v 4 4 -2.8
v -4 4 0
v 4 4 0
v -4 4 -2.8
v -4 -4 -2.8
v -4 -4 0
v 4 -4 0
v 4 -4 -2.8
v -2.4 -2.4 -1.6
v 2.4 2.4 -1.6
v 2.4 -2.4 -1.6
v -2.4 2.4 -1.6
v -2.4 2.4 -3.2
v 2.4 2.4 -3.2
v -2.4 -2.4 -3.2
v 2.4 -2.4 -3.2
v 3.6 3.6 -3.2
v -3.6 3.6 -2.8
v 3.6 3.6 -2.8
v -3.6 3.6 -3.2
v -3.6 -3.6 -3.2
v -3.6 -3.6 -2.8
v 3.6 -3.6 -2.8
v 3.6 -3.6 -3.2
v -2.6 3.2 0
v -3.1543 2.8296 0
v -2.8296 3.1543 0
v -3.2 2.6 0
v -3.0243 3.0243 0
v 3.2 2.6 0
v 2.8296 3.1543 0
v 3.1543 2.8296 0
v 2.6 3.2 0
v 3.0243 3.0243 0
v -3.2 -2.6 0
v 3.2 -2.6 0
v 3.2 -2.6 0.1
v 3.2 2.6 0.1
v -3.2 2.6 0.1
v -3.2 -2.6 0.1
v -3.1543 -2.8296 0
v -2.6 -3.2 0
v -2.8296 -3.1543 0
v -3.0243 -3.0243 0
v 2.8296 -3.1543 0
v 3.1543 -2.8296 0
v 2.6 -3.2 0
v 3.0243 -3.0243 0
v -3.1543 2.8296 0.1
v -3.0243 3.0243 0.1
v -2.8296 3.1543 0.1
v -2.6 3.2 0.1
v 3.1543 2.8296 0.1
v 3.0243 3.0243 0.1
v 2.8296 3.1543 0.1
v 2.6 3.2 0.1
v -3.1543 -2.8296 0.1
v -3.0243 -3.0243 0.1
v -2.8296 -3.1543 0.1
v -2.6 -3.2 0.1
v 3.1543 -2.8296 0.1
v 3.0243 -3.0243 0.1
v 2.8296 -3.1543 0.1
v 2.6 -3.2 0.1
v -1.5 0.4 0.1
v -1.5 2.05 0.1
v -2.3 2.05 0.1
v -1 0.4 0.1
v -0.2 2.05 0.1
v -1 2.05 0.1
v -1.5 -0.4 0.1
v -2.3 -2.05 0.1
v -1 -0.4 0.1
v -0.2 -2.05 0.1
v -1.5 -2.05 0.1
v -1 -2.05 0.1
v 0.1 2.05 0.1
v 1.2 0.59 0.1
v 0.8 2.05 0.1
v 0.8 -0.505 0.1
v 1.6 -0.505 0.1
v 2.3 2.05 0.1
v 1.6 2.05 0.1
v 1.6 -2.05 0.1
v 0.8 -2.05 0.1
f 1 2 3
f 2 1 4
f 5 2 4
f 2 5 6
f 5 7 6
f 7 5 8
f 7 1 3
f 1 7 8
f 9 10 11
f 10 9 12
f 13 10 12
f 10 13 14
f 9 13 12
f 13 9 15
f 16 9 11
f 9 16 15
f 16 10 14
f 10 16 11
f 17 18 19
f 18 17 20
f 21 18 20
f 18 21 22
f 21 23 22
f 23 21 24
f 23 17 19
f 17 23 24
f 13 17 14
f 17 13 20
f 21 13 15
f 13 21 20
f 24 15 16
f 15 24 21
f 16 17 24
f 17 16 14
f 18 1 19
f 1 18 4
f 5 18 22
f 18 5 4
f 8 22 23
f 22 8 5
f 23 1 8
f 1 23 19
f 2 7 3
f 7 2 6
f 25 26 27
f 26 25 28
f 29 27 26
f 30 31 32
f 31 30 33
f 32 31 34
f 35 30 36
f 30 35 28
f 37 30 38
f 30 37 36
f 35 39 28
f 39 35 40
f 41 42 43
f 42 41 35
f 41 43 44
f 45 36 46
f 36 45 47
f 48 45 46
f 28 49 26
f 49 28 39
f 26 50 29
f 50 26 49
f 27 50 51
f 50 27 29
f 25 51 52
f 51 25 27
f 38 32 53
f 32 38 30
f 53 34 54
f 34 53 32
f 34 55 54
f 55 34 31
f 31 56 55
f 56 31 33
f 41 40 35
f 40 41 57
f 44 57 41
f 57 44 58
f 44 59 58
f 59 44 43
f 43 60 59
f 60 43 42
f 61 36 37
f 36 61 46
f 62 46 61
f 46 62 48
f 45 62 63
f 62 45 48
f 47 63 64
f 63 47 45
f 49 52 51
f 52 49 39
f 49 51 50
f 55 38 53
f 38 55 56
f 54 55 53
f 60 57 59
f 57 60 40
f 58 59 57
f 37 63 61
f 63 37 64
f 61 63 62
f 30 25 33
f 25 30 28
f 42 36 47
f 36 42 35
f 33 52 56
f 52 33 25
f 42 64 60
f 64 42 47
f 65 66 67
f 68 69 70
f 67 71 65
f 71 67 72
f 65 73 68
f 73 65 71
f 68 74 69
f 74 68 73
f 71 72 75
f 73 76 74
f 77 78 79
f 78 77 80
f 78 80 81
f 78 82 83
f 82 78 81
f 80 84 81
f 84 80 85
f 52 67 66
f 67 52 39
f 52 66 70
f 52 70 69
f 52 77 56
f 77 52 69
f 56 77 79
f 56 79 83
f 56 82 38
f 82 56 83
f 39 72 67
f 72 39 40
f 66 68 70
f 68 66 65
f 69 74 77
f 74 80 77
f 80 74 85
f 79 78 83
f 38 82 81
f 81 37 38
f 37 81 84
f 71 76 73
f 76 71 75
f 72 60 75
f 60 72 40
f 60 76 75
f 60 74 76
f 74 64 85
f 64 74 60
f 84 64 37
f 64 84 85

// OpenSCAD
// file: ../p/box5.scad
use <../lib.scad>
function ldraw_lib__box5() = [
// 0 Box with 5 Faces and All Edges
// 0 Name: box5.dat
// 0 Author: James Jessiman
// 0 !LDRAW_ORG Primitive UPDATE 2012-01
// 0 !LICENSE Licensed under CC BY 4.0 : see CAreadme.txt
// 
// 0 BFC CERTIFY CCW
  [0,"BFC","CERTIFY"],
  [0,"BFC","CCW"],
// 
// 0 !HISTORY 2002-04-03 [sbliss] Modified for BFC compliance
// 0 !HISTORY 2002-04-25 [PTadmin] Official Update 2002-02
// 0 !HISTORY 2007-06-24 [PTadmin] Header formatted for Contributor Agreement
// 0 !HISTORY 2008-07-01 [PTadmin] Official Update 2008-01
// 0 !HISTORY 2012-02-16 [Philo] Changed to CCW
// 0 !HISTORY 2012-03-30 [PTadmin] Official Update 2012-01
// 
// 
// 2 24 1 1 1 -1 1 1
  [2,24,1,1,1,-1,1,1],
// 2 24 -1 1 1 -1 1 -1
  [2,24,-1,1,1,-1,1,-1],
// 2 24 -1 1 -1 1 1 -1
  [2,24,-1,1,-1,1,1,-1],
// 2 24 1 1 -1 1 1 1
  [2,24,1,1,-1,1,1,1],
// 2 24 1 0 1 -1 0 1
  [2,24,1,0,1,-1,0,1],
// 2 24 -1 0 1 -1 0 -1
  [2,24,-1,0,1,-1,0,-1],
// 2 24 -1 0 -1 1 0 -1
  [2,24,-1,0,-1,1,0,-1],
// 2 24 1 0 -1 1 0 1
  [2,24,1,0,-1,1,0,1],
// 2 24 1 0 1 1 1 1
  [2,24,1,0,1,1,1,1],
// 2 24 -1 0 1 -1 1 1
  [2,24,-1,0,1,-1,1,1],
// 2 24 1 0 -1 1 1 -1
  [2,24,1,0,-1,1,1,-1],
// 2 24 -1 0 -1 -1 1 -1
  [2,24,-1,0,-1,-1,1,-1],
// 4 16 -1 1 1 1 1 1 1 1 -1 -1 1 -1
  [4,16,-1,1,1,1,1,1,1,1,-1,-1,1,-1],
// 4 16 -1 1 1 -1 0 1 1 0 1 1 1 1
  [4,16,-1,1,1,-1,0,1,1,0,1,1,1,1],
// 4 16 -1 1 -1 -1 0 -1 -1 0 1 -1 1 1
  [4,16,-1,1,-1,-1,0,-1,-1,0,1,-1,1,1],
// 4 16 1 1 -1 1 0 -1 -1 0 -1 -1 1 -1
  [4,16,1,1,-1,1,0,-1,-1,0,-1,-1,1,-1],
// 4 16 1 1 1 1 0 1 1 0 -1 1 1 -1
  [4,16,1,1,1,1,0,1,1,0,-1,1,1,-1],
];
module ldraw_lib__box5(step=0, col=false, unit=2/5, alt=false, line=0.2, solid=!$preview)
    makepoly(ldraw_lib__box5(), step=step, col=col, unit=unit, alt=alt, line=line, solid=solid);
ldraw_lib__box5(line=0.2);
// file: ../p/box4.scad
use <../lib.scad>
function ldraw_lib__box4() = [
// 0 Box with 4 Faces (2 Parallel Pairs) and All Edges
// 0 Name: box4.dat
// 0 Author: James Jessiman
// 0 !LDRAW_ORG Primitive UPDATE 2012-01
// 0 !LICENSE Licensed under CC BY 4.0 : see CAreadme.txt
// 
// 0 BFC CERTIFY CCW
  [0,"BFC","CERTIFY"],
  [0,"BFC","CCW"],
// 
// 0 !HISTORY 2002-04-03 [sbliss] Modified for BFC compliance
// 0 !HISTORY 2002-04-25 [PTadmin] Official Update 2002-02
// 0 !HISTORY 2007-06-24 [PTadmin] Header formatted for Contributor Agreement
// 0 !HISTORY 2008-07-01 [PTadmin] Official Update 2008-01
// 0 !HISTORY 2012-02-16 [Philo] Changed to CCW
// 0 !HISTORY 2012-03-30 [PTadmin] Official Update 2012-01
// 
// 
// 2 24 1 1 1 -1 1 1
  [2,24,1,1,1,-1,1,1],
// 2 24 -1 1 1 -1 1 -1
  [2,24,-1,1,1,-1,1,-1],
// 2 24 -1 1 -1 1 1 -1
  [2,24,-1,1,-1,1,1,-1],
// 2 24 1 1 -1 1 1 1
  [2,24,1,1,-1,1,1,1],
// 2 24 1 0 1 -1 0 1
  [2,24,1,0,1,-1,0,1],
// 2 24 -1 0 1 -1 0 -1
  [2,24,-1,0,1,-1,0,-1],
// 2 24 -1 0 -1 1 0 -1
  [2,24,-1,0,-1,1,0,-1],
// 2 24 1 0 -1 1 0 1
  [2,24,1,0,-1,1,0,1],
// 2 24 1 0 1 1 1 1
  [2,24,1,0,1,1,1,1],
// 2 24 -1 0 1 -1 1 1
  [2,24,-1,0,1,-1,1,1],
// 2 24 1 0 -1 1 1 -1
  [2,24,1,0,-1,1,1,-1],
// 2 24 -1 0 -1 -1 1 -1
  [2,24,-1,0,-1,-1,1,-1],
// 4 16 -1 1 1 -1 0 1 1 0 1 1 1 1
  [4,16,-1,1,1,-1,0,1,1,0,1,1,1,1],
// 4 16 -1 1 -1 -1 0 -1 -1 0 1 -1 1 1
  [4,16,-1,1,-1,-1,0,-1,-1,0,1,-1,1,1],
// 4 16 1 1 -1 1 0 -1 -1 0 -1 -1 1 -1
  [4,16,1,1,-1,1,0,-1,-1,0,-1,-1,1,-1],
// 4 16 1 1 1 1 0 1 1 0 -1 1 1 -1
  [4,16,1,1,1,1,0,1,1,0,-1,1,1,-1],
];
module ldraw_lib__box4(step=0, col=false, unit=2/5, alt=false, line=0.2, solid=!$preview)
    makepoly(ldraw_lib__box4(), step=step, col=col, unit=unit, alt=alt, line=line, solid=solid);
ldraw_lib__box4(line=0.2);
// file: ../p/box3u12.scad
use <../lib.scad>
function ldraw_lib__box3u12() = [
// 0 Box with 3 Parallel Faces without Any Edges
// 0 Name: box3u12.dat
// 0 Author: J.C. Tchang [tchang]
// 0 !LDRAW_ORG Primitive UPDATE 2014-02
// 0 !LICENSE Licensed under CC BY 4.0 : see CAreadme.txt
// 
// 0 BFC CERTIFY CCW
  [0,"BFC","CERTIFY"],
  [0,"BFC","CCW"],
// 
// 0 !HISTORY 2014-12-23 [PTadmin] Official Update 2014-02
// 
// 
// 4 16 -1 1 1 1 1 1 1 1 -1 -1 1 -1
  [4,16,-1,1,1,1,1,1,1,1,-1,-1,1,-1],
// 4 16 -1 1 1 -1 0 1 1 0 1 1 1 1
  [4,16,-1,1,1,-1,0,1,1,0,1,1,1,1],
// 4 16 1 1 -1 1 0 -1 -1 0 -1 -1 1 -1
  [4,16,1,1,-1,1,0,-1,-1,0,-1,-1,1,-1],
];
module ldraw_lib__box3u12(step=0, col=false, unit=2/5, alt=false, line=0.2, solid=!$preview)
    makepoly(ldraw_lib__box3u12(), step=step, col=col, unit=unit, alt=alt, line=line, solid=solid);
ldraw_lib__box3u12(line=0.2);
// file: ../p/1-4cyli.scad
use <../lib.scad>
function ldraw_lib__1_4cyli() = [
// 0 Cylinder 0.25
// 0 Name: 1-4cyli.dat
// 0 Author: James Jessiman
// 0 !LDRAW_ORG Primitive UPDATE 2012-01
// 0 !LICENSE Licensed under CC BY 4.0 : see CAreadme.txt
// 
// 0 BFC CERTIFY CCW
  [0,"BFC","CERTIFY"],
  [0,"BFC","CCW"],
// 
// 0 !HISTORY 2002-03-23 [sbliss] Added BFC statement.
// 0 !HISTORY 2002-04-25 [PTadmin] Official Update 2002-02
// 0 !HISTORY 2007-06-22 [PTadmin] Header formatted for Contributor Agreement
// 0 !HISTORY 2008-07-01 [PTadmin] Official Update 2008-01
// 0 !HISTORY 2012-02-16 [Philo] Changed to CCW
// 0 !HISTORY 2012-03-30 [PTadmin] Official Update 2012-01
// 
// 
// 4 16 1 1 0 0.9239 1 0.3827 0.9239 0 0.3827 1 0 0
  [4,16,1,1,0,0.9239,1,0.3827,0.9239,0,0.3827,1,0,0],
// 5 24 1 0 0 1 1 0 0.9239 0 0.3827 1 0 -1
  [5,24,1,0,0,1,1,0,0.9239,0,0.3827,1,0,-1],
// 4 16 0.9239 1 0.3827 0.7071 1 0.7071 0.7071 0 0.7071 0.9239 0 0.3827
  [4,16,0.9239,1,0.3827,0.7071,1,0.7071,0.7071,0,0.7071,0.9239,0,0.3827],
// 5 24 0.9239 0 0.3827 0.9239 1 0.3827 0.7071 0 0.7071 1 0 0
  [5,24,0.9239,0,0.3827,0.9239,1,0.3827,0.7071,0,0.7071,1,0,0],
// 4 16 0.7071 1 0.7071 0.3827 1 0.9239 0.3827 0 0.9239 0.7071 0 0.7071
  [4,16,0.7071,1,0.7071,0.3827,1,0.9239,0.3827,0,0.9239,0.7071,0,0.7071],
// 5 24 0.7071 0 0.7071 0.7071 1 0.7071 0.3827 0 0.9239 0.9239 0 0.3827
  [5,24,0.7071,0,0.7071,0.7071,1,0.7071,0.3827,0,0.9239,0.9239,0,0.3827],
// 4 16 0.3827 1 0.9239 0 1 1 0 0 1 0.3827 0 0.9239
  [4,16,0.3827,1,0.9239,0,1,1,0,0,1,0.3827,0,0.9239],
// 5 24 0.3827 0 0.9239 0.3827 1 0.9239 0 0 1 0.7071 0 0.7071
  [5,24,0.3827,0,0.9239,0.3827,1,0.9239,0,0,1,0.7071,0,0.7071],
// 5 24 0 0 1 0 1 1 0.3827 0 0.9239 -1 0 1
  [5,24,0,0,1,0,1,1,0.3827,0,0.9239,-1,0,1],
];
module ldraw_lib__1_4cyli(step=0, col=false, unit=2/5, alt=false, line=0.2, solid=!$preview)
    makepoly(ldraw_lib__1_4cyli(), step=step, col=col, unit=unit, alt=alt, line=line, solid=solid);
ldraw_lib__1_4cyli(line=0.2);
// file: ../p/1-4chrd.scad
use <../lib.scad>
function ldraw_lib__1_4chrd() = [
// 0 Chord 0.25
// 0 Name: 1-4chrd.dat
// 0 Author: Max Martin Richter [MMR1988]
// 0 !LDRAW_ORG Primitive UPDATE 2023-05
// 0 !LICENSE Licensed under CC BY 4.0 : see CAreadme.txt
// 
// 0 BFC CERTIFY CCW
  [0,"BFC","CERTIFY"],
  [0,"BFC","CCW"],
// 
// 0 !HISTORY 2004-04-22 [PTadmin] Official Update 2004-02
// 0 !HISTORY 2007-10-09 [PTadmin] Header formatted for Contributor Agreement
// 0 !HISTORY 2008-07-01 [PTadmin] Official Update 2008-01
// 0 !HISTORY 2012-08-02 [MMR1988] Re-creation with PrimGen2 and Rectifier
// 0 !HISTORY 2012-08-09 [PTadmin] Official Update 2012-02
// 0 !HISTORY 2023-10-27 [OrionP] Change author to MMR1988 from hafhead
// 0 !HISTORY 2023-10-31 [OrionP] Official Update 2023-05
// 
// 4 16 0.9239 0 0.3827 0.3827 0 0.9239 0 0 1 1 0 0
  [4,16,0.9239,0,0.3827,0.3827,0,0.9239,0,0,1,1,0,0],
// 3 16 0.7071 0 0.7071 0.3827 0 0.9239 0.9239 0 0.3827
  [3,16,0.7071,0,0.7071,0.3827,0,0.9239,0.9239,0,0.3827],
];
module ldraw_lib__1_4chrd(step=0, col=false, unit=2/5, alt=false, line=0.2, solid=!$preview)
    makepoly(ldraw_lib__1_4chrd(), step=step, col=col, unit=unit, alt=alt, line=line, solid=solid);
ldraw_lib__1_4chrd(line=0.2);
// file: s/3070bs01.scad
use <../../lib.scad>
use <../../p/box4.scad>
use <../../p/box5.scad>
function ldraw_lib__s__3070bs01() = [
// 0 ~Tile  1 x  1 with Groove without Top Face
// 0 Name: s\3070bs01.dat
// 0 Author: Chris Dee [cwdee]
// 0 !LDRAW_ORG Subpart UPDATE 2009-02
// 0 !LICENSE Licensed under CC BY 4.0 : see CAreadme.txt
// 
// 0 BFC CERTIFY CCW
  [0,"BFC","CERTIFY"],
  [0,"BFC","CCW"],
// 
// 0 !HISTORY 2009-09-03 [PTadmin] Official Update 2009-02
// 
// 
// 1 16 0 0 0 10 0 0 0 7 0 0 0 10 box4.dat
  [1,16,0,0,0,10,0,0,0,7,0,0,0,10, ldraw_lib__box4()],
// 0 BFC INVERTNEXT
  [0,"BFC","INVERTNEXT"],
// 1 16 0 8 0 6 0 0 0 -4 0 0 0 6 box5.dat
  [1,16,0,8,0,6,0,0,0,-4,0,0,0,6, ldraw_lib__box5()],
// 1 16 0 7 0 9 0 0 0 1 0 0 0 9 box4.dat
  [1,16,0,7,0,9,0,0,0,1,0,0,0,9, ldraw_lib__box4()],
// 
// 4 16 9 8 9 6 8 6 -6 8 6 -9 8 9
  [4,16,9,8,9,6,8,6,-6,8,6,-9,8,9],
// 4 16 -9 8 9 -6 8 6 -6 8 -6 -9 8 -9
  [4,16,-9,8,9,-6,8,6,-6,8,-6,-9,8,-9],
// 4 16 -9 8 -9 -6 8 -6 6 8 -6 9 8 -9
  [4,16,-9,8,-9,-6,8,-6,6,8,-6,9,8,-9],
// 4 16 9 8 -9 6 8 -6 6 8 6 9 8 9
  [4,16,9,8,-9,6,8,-6,6,8,6,9,8,9],
// 
// 4 16 10 7 10 9 7 9 -9 7 9 -10 7 10
  [4,16,10,7,10,9,7,9,-9,7,9,-10,7,10],
// 4 16 -10 7 10 -9 7 9 -9 7 -9 -10 7 -10
  [4,16,-10,7,10,-9,7,9,-9,7,-9,-10,7,-10],
// 4 16 -10 7 -10 -9 7 -9 9 7 -9 10 7 -10
  [4,16,-10,7,-10,-9,7,-9,9,7,-9,10,7,-10],
// 4 16 10 7 -10 9 7 -9 9 7 9 10 7 10
  [4,16,10,7,-10,9,7,-9,9,7,9,10,7,10],
// 0
];
module ldraw_lib__s__3070bs01(step=0, col=false, unit=2/5, alt=false, line=0.2, solid=!$preview)
    makepoly(ldraw_lib__s__3070bs01(), step=step, col=col, unit=unit, alt=alt, line=line, solid=solid);
ldraw_lib__s__3070bs01(line=0.2);
// file: 6142275t.scad
use <../lib.scad>
use <../p/1-4chrd.scad>
use <../p/1-4cyli.scad>
use <../p/box3u12.scad>
function ldraw_lib__6142275t() = [
// 0 Sticker  0.8 x  0.8 with Red "HY" in White Square on Red Background
// 0 Name: 6142275t.dat
// 0 Author: Massimo Maso [Sirio]
// 0 !LDRAW_ORG Part UPDATE 2022-06
// 0 !LICENSE Licensed under CC BY 4.0 : see CAreadme.txt
// 
// 0 BFC CERTIFY CCW
  [0,"BFC","CERTIFY"],
  [0,"BFC","CCW"],
// 
// 0 !KEYWORDS Audi, e-tron, quattro, R18, Set 75872, Speed Champions
// 
// 0 !HISTORY 2022-12-20 [PTadmin] Official Update 2022-06
// 
// 
// 0 // Primitives
// 1 16 -6.5 0 6.5 -1.5 0 0 0 -1 0 0 0 1.5 1-4chrd.dat
  [1,16,-6.5,0,6.5,-1.5,0,0,0,-1,0,0,0,1.5, ldraw_lib__1_4chrd()],
// 1 16 6.5 0 6.5 1.5 0 0 0 -1 0 0 0 1.5 1-4chrd.dat
  [1,16,6.5,0,6.5,1.5,0,0,0,-1,0,0,0,1.5, ldraw_lib__1_4chrd()],
// 1 16 0 -.25 0 0 0 8 0 .25 0 -6.5 0 0 box3u12.dat
  [1,16,0,-.25,0,0,0,8,0,.25,0,-6.5,0,0, ldraw_lib__box3u12()],
// 1 16 -6.5 0 -6.5 -1.5 0 0 0 -1 0 0 0 -1.5 1-4chrd.dat
  [1,16,-6.5,0,-6.5,-1.5,0,0,0,-1,0,0,0,-1.5, ldraw_lib__1_4chrd()],
// 1 16 6.5 0 -6.5 1.5 0 0 0 -1 0 0 0 -1.5 1-4chrd.dat
  [1,16,6.5,0,-6.5,1.5,0,0,0,-1,0,0,0,-1.5, ldraw_lib__1_4chrd()],
// 1 16 -6.5 0 6.5 -1.5 0 0 0 -.25 0 0 0 1.5 1-4cyli.dat
  [1,16,-6.5,0,6.5,-1.5,0,0,0,-.25,0,0,0,1.5, ldraw_lib__1_4cyli()],
// 1 16 6.5 0 6.5 1.5 0 0 0 -.25 0 0 0 1.5 1-4cyli.dat
  [1,16,6.5,0,6.5,1.5,0,0,0,-.25,0,0,0,1.5, ldraw_lib__1_4cyli()],
// 1 16 -6.5 0 -6.5 -1.5 0 0 0 -.25 0 0 0 -1.5 1-4cyli.dat
  [1,16,-6.5,0,-6.5,-1.5,0,0,0,-.25,0,0,0,-1.5, ldraw_lib__1_4cyli()],
// 1 16 6.5 0 -6.5 1.5 0 0 0 -.25 0 0 0 -1.5 1-4cyli.dat
  [1,16,6.5,0,-6.5,1.5,0,0,0,-.25,0,0,0,-1.5, ldraw_lib__1_4cyli()],
// 1 4 -6.5 -.25 6.5 -1.5 0 0 0 1 0 0 0 1.5 1-4chrd.dat
  [1,4,-6.5,-.25,6.5,-1.5,0,0,0,1,0,0,0,1.5, ldraw_lib__1_4chrd()],
// 1 4 6.5 -.25 6.5 1.5 0 0 0 1 0 0 0 1.5 1-4chrd.dat
  [1,4,6.5,-.25,6.5,1.5,0,0,0,1,0,0,0,1.5, ldraw_lib__1_4chrd()],
// 1 4 -6.5 -.25 -6.5 -1.5 0 0 0 1 0 0 0 -1.5 1-4chrd.dat
  [1,4,-6.5,-.25,-6.5,-1.5,0,0,0,1,0,0,0,-1.5, ldraw_lib__1_4chrd()],
// 1 4 6.5 -.25 -6.5 1.5 0 0 0 1 0 0 0 -1.5 1-4chrd.dat
  [1,4,6.5,-.25,-6.5,1.5,0,0,0,1,0,0,0,-1.5, ldraw_lib__1_4chrd()],
// 0 // Bottom faces
// 4 16 6.5 0 8 8 0 6.5 -8 0 6.5 -6.5 0 8
  [4,16,6.5,0,8,8,0,6.5,-8,0,6.5,-6.5,0,8],
// 4 16 6.5 0 -8 -6.5 0 -8 -8 0 -6.5 8 0 -6.5
  [4,16,6.5,0,-8,-6.5,0,-8,-8,0,-6.5,8,0,-6.5],
// 0 // Lateral faces
// 4 16 -6.5 0 8 -6.5 -.25 8 6.5 -.25 8 6.5 0 8
  [4,16,-6.5,0,8,-6.5,-.25,8,6.5,-.25,8,6.5,0,8],
// 4 16 -6.5 0 -8 6.5 0 -8 6.5 -.25 -8 -6.5 -.25 -8
  [4,16,-6.5,0,-8,6.5,0,-8,6.5,-.25,-8,-6.5,-.25,-8],
// 0 // Top faces
// 0 // White Text "HY"
// 0 // Letter "H"
// 3 15 -3.75 -.25 1 -3.75 -.25 5.125 -5.75 -.25 5.125
  [3,15,-3.75,-.25,1,-3.75,-.25,5.125,-5.75,-.25,5.125],
// 3 15 -2.5 -.25 1 -.5 -.25 5.125 -2.5 -.25 5.125
  [3,15,-2.5,-.25,1,-.5,-.25,5.125,-2.5,-.25,5.125],
// 4 15 -3.75 -.25 1 -5.75 -.25 5.125 -5.75 -.25 -5.125 -3.75 -.25 -1
  [4,15,-3.75,-.25,1,-5.75,-.25,5.125,-5.75,-.25,-5.125,-3.75,-.25,-1],
// 4 15 -3.75 -.25 1 -3.75 -.25 -1 -2.5 -.25 -1 -2.5 -.25 1
  [4,15,-3.75,-.25,1,-3.75,-.25,-1,-2.5,-.25,-1,-2.5,-.25,1],
// 4 15 -2.5 -.25 1 -2.5 -.25 -1 -.5 -.25 -5.125 -.5 -.25 5.125
  [4,15,-2.5,-.25,1,-2.5,-.25,-1,-.5,-.25,-5.125,-.5,-.25,5.125],
// 3 15 -3.75 -.25 -1 -5.75 -.25 -5.125 -3.75 -.25 -5.125
  [3,15,-3.75,-.25,-1,-5.75,-.25,-5.125,-3.75,-.25,-5.125],
// 3 15 -2.5 -.25 -1 -2.5 -.25 -5.125 -.5 -.25 -5.125
  [3,15,-2.5,-.25,-1,-2.5,-.25,-5.125,-.5,-.25,-5.125],
// 0 // Letter "Y"
// 4 15 3 -.25 1.475 2 -.25 5.125 .25 -.25 5.125 2 -.25 -1.2625
  [4,15,3,-.25,1.475,2,-.25,5.125,.25,-.25,5.125,2,-.25,-1.2625],
// 3 15 3 -.25 1.475 2 -.25 -1.2625 4 -.25 -1.2625
  [3,15,3,-.25,1.475,2,-.25,-1.2625,4,-.25,-1.2625],
// 4 15 3 -.25 1.475 4 -.25 -1.2625 5.75 -.25 5.125 4 -.25 5.125
  [4,15,3,-.25,1.475,4,-.25,-1.2625,5.75,-.25,5.125,4,-.25,5.125],
// 4 15 2 -.25 -1.2625 2 -.25 -5.125 4 -.25 -5.125 4 -.25 -1.2625
  [4,15,2,-.25,-1.2625,2,-.25,-5.125,4,-.25,-5.125,4,-.25,-1.2625],
// 0 // Red background
// 4 4 -6.5 -.25 8 -8 -.25 6.5 -5.75 -.25 5.125 -3.75 -.25 5.125
  [4,4,-6.5,-.25,8,-8,-.25,6.5,-5.75,-.25,5.125,-3.75,-.25,5.125],
// 3 4 -6.5 -.25 8 -3.75 -.25 5.125 -2.5 -.25 5.125
  [3,4,-6.5,-.25,8,-3.75,-.25,5.125,-2.5,-.25,5.125],
// 3 4 -6.5 -.25 8 -2.5 -.25 5.125 -.5 -.25 5.125
  [3,4,-6.5,-.25,8,-2.5,-.25,5.125,-.5,-.25,5.125],
// 4 4 -6.5 -.25 8 -.5 -.25 5.125 .25 -.25 5.125 6.5 -.25 8
  [4,4,-6.5,-.25,8,-.5,-.25,5.125,.25,-.25,5.125,6.5,-.25,8],
// 3 4 6.5 -.25 8 .25 -.25 5.125 2 -.25 5.125
  [3,4,6.5,-.25,8,.25,-.25,5.125,2,-.25,5.125],
// 3 4 6.5 -.25 8 2 -.25 5.125 4 -.25 5.125
  [3,4,6.5,-.25,8,2,-.25,5.125,4,-.25,5.125],
// 4 4 6.5 -.25 8 4 -.25 5.125 5.75 -.25 5.125 8 -.25 6.5
  [4,4,6.5,-.25,8,4,-.25,5.125,5.75,-.25,5.125,8,-.25,6.5],
// 4 4 -8 -.25 6.5 -8 -.25 -6.5 -5.75 -.25 -5.125 -5.75 -.25 5.125
  [4,4,-8,-.25,6.5,-8,-.25,-6.5,-5.75,-.25,-5.125,-5.75,-.25,5.125],
// 4 4 -3.75 -.25 5.125 -3.75 -.25 1 -2.5 -.25 1 -2.5 -.25 5.125
  [4,4,-3.75,-.25,5.125,-3.75,-.25,1,-2.5,-.25,1,-2.5,-.25,5.125],
// 3 4 -.5 -.25 5.125 -.5 -.25 -5.125 .25 -.25 5.125
  [3,4,-.5,-.25,5.125,-.5,-.25,-5.125,.25,-.25,5.125],
// 4 4 .25 -.25 5.125 -.5 -.25 -5.125 2 -.25 -5.125 2 -.25 -1.2625
  [4,4,.25,-.25,5.125,-.5,-.25,-5.125,2,-.25,-5.125,2,-.25,-1.2625],
// 3 4 2 -.25 5.125 3 -.25 1.475 4 -.25 5.125
  [3,4,2,-.25,5.125,3,-.25,1.475,4,-.25,5.125],
// 3 4 8 -.25 6.5 5.75 -.25 5.125 4 -.25 -1.2625
  [3,4,8,-.25,6.5,5.75,-.25,5.125,4,-.25,-1.2625],
// 4 4 8 -.25 6.5 4 -.25 -1.2625 4 -.25 -5.125 8 -.25 -6.5
  [4,4,8,-.25,6.5,4,-.25,-1.2625,4,-.25,-5.125,8,-.25,-6.5],
// 4 4 -3.75 -.25 -1 -3.75 -.25 -5.125 -2.5 -.25 -5.125 -2.5 -.25 -1
  [4,4,-3.75,-.25,-1,-3.75,-.25,-5.125,-2.5,-.25,-5.125,-2.5,-.25,-1],
// 4 4 -5.75 -.25 -5.125 -8 -.25 -6.5 -6.5 -.25 -8 -3.75 -.25 -5.125
  [4,4,-5.75,-.25,-5.125,-8,-.25,-6.5,-6.5,-.25,-8,-3.75,-.25,-5.125],
// 3 4 -6.5 -.25 -8 -2.5 -.25 -5.125 -3.75 -.25 -5.125
  [3,4,-6.5,-.25,-8,-2.5,-.25,-5.125,-3.75,-.25,-5.125],
// 3 4 -6.5 -.25 -8 -.5 -.25 -5.125 -2.5 -.25 -5.125
  [3,4,-6.5,-.25,-8,-.5,-.25,-5.125,-2.5,-.25,-5.125],
// 4 4 -6.5 -.25 -8 6.5 -.25 -8 2 -.25 -5.125 -.5 -.25 -5.125
  [4,4,-6.5,-.25,-8,6.5,-.25,-8,2,-.25,-5.125,-.5,-.25,-5.125],
// 4 4 6.5 -.25 -8 8 -.25 -6.5 4 -.25 -5.125 2 -.25 -5.125
  [4,4,6.5,-.25,-8,8,-.25,-6.5,4,-.25,-5.125,2,-.25,-5.125],
];
module ldraw_lib__6142275t(step=0, col=false, unit=2/5, alt=false, line=0.2, solid=!$preview)
    makepoly(ldraw_lib__6142275t(), step=step, col=col, unit=unit, alt=alt, line=line, solid=solid);
ldraw_lib__6142275t(line=0.2);
// file: 3070b.scad
use <../lib.scad>
use <s/3070bs01.scad>
function ldraw_lib__3070b() = [
// 0 Tile  1 x  1 with Groove
// 0 Name: 3070b.dat
// 0 Author: Chris Dee [cwdee]
// 0 !LDRAW_ORG Part UPDATE 2025-09
// 0 !LICENSE Licensed under CC BY 4.0 : see CAreadme.txt
// 
// 0 BFC CERTIFY CCW
  [0,"BFC","CERTIFY"],
  [0,"BFC","CCW"],
// 
// 0 !KEYWORDS BrickLink 3070
// 
// 0 !HISTORY 2009-09-03 [PTadmin] Official Update 2009-02
// 0 !HISTORY 2025-09-27 [OrionP] Changed winding to CCW
// 0 !HISTORY 2025-09-29 [OrionP] Official Update 2025-09
// 
// 1 16 0 0 0 1 0 0 0 1 0 0 0 1 s\3070bs01.dat
  [1,16,0,0,0,1,0,0,0,1,0,0,0,1, ldraw_lib__s__3070bs01()],
// 4 16 -10 0 10 -10 0 -10 10 0 -10 10 0 10
  [4,16,-10,0,10,-10,0,-10,10,0,-10,10,0,10],
// 0
];
module ldraw_lib__3070b(step=0, col=false, unit=2/5, alt=false, line=0.2, solid=!$preview)
    makepoly(ldraw_lib__3070b(), step=step, col=col, unit=unit, alt=alt, line=line, solid=solid);
ldraw_lib__3070b(line=0.2);
// main file
use <../lib.scad>
use <3070b.scad>
use <6142275t.scad>
function ldraw_lib__3070bd07() = [
// 0 Tile  1 x  1 with Red "HY" in White Square on Red Background Sticker
// 0 Name: 3070bd07.dat
// 0 Author: Vincent Messenet [Cheenzo]
// 0 !LDRAW_ORG Shortcut UPDATE 2026-05
// 0 !LICENSE Licensed under CC BY 4.0 : see CAreadme.txt
// 
// 0 BFC CERTIFY CCW
  [0,"BFC","CERTIFY"],
  [0,"BFC","CCW"],
// 
// 0 !CATEGORY Sticker Shortcut
// 
// 0 !KEYWORDS Bricklink 3070pb348R, Set 75872
// 
// 0 !HISTORY 2026-05-31 [OrionP] Official Update 2026-05
// 
// 1 16 0 0 0 1 0 0 0 1 0 0 0 1 3070b.dat
  [1,16,0,0,0,1,0,0,0,1,0,0,0,1, ldraw_lib__3070b()],
// 1 16 0 0 0 1 0 0 0 1 0 0 0 1 6142275t.dat
  [1,16,0,0,0,1,0,0,0,1,0,0,0,1, ldraw_lib__6142275t()],
];
module ldraw_lib__3070bd07(step=0, col=false, unit=2/5, alt=false, line=0.2, solid=!$preview)
    makepoly(ldraw_lib__3070bd07(), step=step, col=col, unit=unit, alt=alt, line=line, solid=solid);
ldraw_lib__3070bd07(line=0.2);
